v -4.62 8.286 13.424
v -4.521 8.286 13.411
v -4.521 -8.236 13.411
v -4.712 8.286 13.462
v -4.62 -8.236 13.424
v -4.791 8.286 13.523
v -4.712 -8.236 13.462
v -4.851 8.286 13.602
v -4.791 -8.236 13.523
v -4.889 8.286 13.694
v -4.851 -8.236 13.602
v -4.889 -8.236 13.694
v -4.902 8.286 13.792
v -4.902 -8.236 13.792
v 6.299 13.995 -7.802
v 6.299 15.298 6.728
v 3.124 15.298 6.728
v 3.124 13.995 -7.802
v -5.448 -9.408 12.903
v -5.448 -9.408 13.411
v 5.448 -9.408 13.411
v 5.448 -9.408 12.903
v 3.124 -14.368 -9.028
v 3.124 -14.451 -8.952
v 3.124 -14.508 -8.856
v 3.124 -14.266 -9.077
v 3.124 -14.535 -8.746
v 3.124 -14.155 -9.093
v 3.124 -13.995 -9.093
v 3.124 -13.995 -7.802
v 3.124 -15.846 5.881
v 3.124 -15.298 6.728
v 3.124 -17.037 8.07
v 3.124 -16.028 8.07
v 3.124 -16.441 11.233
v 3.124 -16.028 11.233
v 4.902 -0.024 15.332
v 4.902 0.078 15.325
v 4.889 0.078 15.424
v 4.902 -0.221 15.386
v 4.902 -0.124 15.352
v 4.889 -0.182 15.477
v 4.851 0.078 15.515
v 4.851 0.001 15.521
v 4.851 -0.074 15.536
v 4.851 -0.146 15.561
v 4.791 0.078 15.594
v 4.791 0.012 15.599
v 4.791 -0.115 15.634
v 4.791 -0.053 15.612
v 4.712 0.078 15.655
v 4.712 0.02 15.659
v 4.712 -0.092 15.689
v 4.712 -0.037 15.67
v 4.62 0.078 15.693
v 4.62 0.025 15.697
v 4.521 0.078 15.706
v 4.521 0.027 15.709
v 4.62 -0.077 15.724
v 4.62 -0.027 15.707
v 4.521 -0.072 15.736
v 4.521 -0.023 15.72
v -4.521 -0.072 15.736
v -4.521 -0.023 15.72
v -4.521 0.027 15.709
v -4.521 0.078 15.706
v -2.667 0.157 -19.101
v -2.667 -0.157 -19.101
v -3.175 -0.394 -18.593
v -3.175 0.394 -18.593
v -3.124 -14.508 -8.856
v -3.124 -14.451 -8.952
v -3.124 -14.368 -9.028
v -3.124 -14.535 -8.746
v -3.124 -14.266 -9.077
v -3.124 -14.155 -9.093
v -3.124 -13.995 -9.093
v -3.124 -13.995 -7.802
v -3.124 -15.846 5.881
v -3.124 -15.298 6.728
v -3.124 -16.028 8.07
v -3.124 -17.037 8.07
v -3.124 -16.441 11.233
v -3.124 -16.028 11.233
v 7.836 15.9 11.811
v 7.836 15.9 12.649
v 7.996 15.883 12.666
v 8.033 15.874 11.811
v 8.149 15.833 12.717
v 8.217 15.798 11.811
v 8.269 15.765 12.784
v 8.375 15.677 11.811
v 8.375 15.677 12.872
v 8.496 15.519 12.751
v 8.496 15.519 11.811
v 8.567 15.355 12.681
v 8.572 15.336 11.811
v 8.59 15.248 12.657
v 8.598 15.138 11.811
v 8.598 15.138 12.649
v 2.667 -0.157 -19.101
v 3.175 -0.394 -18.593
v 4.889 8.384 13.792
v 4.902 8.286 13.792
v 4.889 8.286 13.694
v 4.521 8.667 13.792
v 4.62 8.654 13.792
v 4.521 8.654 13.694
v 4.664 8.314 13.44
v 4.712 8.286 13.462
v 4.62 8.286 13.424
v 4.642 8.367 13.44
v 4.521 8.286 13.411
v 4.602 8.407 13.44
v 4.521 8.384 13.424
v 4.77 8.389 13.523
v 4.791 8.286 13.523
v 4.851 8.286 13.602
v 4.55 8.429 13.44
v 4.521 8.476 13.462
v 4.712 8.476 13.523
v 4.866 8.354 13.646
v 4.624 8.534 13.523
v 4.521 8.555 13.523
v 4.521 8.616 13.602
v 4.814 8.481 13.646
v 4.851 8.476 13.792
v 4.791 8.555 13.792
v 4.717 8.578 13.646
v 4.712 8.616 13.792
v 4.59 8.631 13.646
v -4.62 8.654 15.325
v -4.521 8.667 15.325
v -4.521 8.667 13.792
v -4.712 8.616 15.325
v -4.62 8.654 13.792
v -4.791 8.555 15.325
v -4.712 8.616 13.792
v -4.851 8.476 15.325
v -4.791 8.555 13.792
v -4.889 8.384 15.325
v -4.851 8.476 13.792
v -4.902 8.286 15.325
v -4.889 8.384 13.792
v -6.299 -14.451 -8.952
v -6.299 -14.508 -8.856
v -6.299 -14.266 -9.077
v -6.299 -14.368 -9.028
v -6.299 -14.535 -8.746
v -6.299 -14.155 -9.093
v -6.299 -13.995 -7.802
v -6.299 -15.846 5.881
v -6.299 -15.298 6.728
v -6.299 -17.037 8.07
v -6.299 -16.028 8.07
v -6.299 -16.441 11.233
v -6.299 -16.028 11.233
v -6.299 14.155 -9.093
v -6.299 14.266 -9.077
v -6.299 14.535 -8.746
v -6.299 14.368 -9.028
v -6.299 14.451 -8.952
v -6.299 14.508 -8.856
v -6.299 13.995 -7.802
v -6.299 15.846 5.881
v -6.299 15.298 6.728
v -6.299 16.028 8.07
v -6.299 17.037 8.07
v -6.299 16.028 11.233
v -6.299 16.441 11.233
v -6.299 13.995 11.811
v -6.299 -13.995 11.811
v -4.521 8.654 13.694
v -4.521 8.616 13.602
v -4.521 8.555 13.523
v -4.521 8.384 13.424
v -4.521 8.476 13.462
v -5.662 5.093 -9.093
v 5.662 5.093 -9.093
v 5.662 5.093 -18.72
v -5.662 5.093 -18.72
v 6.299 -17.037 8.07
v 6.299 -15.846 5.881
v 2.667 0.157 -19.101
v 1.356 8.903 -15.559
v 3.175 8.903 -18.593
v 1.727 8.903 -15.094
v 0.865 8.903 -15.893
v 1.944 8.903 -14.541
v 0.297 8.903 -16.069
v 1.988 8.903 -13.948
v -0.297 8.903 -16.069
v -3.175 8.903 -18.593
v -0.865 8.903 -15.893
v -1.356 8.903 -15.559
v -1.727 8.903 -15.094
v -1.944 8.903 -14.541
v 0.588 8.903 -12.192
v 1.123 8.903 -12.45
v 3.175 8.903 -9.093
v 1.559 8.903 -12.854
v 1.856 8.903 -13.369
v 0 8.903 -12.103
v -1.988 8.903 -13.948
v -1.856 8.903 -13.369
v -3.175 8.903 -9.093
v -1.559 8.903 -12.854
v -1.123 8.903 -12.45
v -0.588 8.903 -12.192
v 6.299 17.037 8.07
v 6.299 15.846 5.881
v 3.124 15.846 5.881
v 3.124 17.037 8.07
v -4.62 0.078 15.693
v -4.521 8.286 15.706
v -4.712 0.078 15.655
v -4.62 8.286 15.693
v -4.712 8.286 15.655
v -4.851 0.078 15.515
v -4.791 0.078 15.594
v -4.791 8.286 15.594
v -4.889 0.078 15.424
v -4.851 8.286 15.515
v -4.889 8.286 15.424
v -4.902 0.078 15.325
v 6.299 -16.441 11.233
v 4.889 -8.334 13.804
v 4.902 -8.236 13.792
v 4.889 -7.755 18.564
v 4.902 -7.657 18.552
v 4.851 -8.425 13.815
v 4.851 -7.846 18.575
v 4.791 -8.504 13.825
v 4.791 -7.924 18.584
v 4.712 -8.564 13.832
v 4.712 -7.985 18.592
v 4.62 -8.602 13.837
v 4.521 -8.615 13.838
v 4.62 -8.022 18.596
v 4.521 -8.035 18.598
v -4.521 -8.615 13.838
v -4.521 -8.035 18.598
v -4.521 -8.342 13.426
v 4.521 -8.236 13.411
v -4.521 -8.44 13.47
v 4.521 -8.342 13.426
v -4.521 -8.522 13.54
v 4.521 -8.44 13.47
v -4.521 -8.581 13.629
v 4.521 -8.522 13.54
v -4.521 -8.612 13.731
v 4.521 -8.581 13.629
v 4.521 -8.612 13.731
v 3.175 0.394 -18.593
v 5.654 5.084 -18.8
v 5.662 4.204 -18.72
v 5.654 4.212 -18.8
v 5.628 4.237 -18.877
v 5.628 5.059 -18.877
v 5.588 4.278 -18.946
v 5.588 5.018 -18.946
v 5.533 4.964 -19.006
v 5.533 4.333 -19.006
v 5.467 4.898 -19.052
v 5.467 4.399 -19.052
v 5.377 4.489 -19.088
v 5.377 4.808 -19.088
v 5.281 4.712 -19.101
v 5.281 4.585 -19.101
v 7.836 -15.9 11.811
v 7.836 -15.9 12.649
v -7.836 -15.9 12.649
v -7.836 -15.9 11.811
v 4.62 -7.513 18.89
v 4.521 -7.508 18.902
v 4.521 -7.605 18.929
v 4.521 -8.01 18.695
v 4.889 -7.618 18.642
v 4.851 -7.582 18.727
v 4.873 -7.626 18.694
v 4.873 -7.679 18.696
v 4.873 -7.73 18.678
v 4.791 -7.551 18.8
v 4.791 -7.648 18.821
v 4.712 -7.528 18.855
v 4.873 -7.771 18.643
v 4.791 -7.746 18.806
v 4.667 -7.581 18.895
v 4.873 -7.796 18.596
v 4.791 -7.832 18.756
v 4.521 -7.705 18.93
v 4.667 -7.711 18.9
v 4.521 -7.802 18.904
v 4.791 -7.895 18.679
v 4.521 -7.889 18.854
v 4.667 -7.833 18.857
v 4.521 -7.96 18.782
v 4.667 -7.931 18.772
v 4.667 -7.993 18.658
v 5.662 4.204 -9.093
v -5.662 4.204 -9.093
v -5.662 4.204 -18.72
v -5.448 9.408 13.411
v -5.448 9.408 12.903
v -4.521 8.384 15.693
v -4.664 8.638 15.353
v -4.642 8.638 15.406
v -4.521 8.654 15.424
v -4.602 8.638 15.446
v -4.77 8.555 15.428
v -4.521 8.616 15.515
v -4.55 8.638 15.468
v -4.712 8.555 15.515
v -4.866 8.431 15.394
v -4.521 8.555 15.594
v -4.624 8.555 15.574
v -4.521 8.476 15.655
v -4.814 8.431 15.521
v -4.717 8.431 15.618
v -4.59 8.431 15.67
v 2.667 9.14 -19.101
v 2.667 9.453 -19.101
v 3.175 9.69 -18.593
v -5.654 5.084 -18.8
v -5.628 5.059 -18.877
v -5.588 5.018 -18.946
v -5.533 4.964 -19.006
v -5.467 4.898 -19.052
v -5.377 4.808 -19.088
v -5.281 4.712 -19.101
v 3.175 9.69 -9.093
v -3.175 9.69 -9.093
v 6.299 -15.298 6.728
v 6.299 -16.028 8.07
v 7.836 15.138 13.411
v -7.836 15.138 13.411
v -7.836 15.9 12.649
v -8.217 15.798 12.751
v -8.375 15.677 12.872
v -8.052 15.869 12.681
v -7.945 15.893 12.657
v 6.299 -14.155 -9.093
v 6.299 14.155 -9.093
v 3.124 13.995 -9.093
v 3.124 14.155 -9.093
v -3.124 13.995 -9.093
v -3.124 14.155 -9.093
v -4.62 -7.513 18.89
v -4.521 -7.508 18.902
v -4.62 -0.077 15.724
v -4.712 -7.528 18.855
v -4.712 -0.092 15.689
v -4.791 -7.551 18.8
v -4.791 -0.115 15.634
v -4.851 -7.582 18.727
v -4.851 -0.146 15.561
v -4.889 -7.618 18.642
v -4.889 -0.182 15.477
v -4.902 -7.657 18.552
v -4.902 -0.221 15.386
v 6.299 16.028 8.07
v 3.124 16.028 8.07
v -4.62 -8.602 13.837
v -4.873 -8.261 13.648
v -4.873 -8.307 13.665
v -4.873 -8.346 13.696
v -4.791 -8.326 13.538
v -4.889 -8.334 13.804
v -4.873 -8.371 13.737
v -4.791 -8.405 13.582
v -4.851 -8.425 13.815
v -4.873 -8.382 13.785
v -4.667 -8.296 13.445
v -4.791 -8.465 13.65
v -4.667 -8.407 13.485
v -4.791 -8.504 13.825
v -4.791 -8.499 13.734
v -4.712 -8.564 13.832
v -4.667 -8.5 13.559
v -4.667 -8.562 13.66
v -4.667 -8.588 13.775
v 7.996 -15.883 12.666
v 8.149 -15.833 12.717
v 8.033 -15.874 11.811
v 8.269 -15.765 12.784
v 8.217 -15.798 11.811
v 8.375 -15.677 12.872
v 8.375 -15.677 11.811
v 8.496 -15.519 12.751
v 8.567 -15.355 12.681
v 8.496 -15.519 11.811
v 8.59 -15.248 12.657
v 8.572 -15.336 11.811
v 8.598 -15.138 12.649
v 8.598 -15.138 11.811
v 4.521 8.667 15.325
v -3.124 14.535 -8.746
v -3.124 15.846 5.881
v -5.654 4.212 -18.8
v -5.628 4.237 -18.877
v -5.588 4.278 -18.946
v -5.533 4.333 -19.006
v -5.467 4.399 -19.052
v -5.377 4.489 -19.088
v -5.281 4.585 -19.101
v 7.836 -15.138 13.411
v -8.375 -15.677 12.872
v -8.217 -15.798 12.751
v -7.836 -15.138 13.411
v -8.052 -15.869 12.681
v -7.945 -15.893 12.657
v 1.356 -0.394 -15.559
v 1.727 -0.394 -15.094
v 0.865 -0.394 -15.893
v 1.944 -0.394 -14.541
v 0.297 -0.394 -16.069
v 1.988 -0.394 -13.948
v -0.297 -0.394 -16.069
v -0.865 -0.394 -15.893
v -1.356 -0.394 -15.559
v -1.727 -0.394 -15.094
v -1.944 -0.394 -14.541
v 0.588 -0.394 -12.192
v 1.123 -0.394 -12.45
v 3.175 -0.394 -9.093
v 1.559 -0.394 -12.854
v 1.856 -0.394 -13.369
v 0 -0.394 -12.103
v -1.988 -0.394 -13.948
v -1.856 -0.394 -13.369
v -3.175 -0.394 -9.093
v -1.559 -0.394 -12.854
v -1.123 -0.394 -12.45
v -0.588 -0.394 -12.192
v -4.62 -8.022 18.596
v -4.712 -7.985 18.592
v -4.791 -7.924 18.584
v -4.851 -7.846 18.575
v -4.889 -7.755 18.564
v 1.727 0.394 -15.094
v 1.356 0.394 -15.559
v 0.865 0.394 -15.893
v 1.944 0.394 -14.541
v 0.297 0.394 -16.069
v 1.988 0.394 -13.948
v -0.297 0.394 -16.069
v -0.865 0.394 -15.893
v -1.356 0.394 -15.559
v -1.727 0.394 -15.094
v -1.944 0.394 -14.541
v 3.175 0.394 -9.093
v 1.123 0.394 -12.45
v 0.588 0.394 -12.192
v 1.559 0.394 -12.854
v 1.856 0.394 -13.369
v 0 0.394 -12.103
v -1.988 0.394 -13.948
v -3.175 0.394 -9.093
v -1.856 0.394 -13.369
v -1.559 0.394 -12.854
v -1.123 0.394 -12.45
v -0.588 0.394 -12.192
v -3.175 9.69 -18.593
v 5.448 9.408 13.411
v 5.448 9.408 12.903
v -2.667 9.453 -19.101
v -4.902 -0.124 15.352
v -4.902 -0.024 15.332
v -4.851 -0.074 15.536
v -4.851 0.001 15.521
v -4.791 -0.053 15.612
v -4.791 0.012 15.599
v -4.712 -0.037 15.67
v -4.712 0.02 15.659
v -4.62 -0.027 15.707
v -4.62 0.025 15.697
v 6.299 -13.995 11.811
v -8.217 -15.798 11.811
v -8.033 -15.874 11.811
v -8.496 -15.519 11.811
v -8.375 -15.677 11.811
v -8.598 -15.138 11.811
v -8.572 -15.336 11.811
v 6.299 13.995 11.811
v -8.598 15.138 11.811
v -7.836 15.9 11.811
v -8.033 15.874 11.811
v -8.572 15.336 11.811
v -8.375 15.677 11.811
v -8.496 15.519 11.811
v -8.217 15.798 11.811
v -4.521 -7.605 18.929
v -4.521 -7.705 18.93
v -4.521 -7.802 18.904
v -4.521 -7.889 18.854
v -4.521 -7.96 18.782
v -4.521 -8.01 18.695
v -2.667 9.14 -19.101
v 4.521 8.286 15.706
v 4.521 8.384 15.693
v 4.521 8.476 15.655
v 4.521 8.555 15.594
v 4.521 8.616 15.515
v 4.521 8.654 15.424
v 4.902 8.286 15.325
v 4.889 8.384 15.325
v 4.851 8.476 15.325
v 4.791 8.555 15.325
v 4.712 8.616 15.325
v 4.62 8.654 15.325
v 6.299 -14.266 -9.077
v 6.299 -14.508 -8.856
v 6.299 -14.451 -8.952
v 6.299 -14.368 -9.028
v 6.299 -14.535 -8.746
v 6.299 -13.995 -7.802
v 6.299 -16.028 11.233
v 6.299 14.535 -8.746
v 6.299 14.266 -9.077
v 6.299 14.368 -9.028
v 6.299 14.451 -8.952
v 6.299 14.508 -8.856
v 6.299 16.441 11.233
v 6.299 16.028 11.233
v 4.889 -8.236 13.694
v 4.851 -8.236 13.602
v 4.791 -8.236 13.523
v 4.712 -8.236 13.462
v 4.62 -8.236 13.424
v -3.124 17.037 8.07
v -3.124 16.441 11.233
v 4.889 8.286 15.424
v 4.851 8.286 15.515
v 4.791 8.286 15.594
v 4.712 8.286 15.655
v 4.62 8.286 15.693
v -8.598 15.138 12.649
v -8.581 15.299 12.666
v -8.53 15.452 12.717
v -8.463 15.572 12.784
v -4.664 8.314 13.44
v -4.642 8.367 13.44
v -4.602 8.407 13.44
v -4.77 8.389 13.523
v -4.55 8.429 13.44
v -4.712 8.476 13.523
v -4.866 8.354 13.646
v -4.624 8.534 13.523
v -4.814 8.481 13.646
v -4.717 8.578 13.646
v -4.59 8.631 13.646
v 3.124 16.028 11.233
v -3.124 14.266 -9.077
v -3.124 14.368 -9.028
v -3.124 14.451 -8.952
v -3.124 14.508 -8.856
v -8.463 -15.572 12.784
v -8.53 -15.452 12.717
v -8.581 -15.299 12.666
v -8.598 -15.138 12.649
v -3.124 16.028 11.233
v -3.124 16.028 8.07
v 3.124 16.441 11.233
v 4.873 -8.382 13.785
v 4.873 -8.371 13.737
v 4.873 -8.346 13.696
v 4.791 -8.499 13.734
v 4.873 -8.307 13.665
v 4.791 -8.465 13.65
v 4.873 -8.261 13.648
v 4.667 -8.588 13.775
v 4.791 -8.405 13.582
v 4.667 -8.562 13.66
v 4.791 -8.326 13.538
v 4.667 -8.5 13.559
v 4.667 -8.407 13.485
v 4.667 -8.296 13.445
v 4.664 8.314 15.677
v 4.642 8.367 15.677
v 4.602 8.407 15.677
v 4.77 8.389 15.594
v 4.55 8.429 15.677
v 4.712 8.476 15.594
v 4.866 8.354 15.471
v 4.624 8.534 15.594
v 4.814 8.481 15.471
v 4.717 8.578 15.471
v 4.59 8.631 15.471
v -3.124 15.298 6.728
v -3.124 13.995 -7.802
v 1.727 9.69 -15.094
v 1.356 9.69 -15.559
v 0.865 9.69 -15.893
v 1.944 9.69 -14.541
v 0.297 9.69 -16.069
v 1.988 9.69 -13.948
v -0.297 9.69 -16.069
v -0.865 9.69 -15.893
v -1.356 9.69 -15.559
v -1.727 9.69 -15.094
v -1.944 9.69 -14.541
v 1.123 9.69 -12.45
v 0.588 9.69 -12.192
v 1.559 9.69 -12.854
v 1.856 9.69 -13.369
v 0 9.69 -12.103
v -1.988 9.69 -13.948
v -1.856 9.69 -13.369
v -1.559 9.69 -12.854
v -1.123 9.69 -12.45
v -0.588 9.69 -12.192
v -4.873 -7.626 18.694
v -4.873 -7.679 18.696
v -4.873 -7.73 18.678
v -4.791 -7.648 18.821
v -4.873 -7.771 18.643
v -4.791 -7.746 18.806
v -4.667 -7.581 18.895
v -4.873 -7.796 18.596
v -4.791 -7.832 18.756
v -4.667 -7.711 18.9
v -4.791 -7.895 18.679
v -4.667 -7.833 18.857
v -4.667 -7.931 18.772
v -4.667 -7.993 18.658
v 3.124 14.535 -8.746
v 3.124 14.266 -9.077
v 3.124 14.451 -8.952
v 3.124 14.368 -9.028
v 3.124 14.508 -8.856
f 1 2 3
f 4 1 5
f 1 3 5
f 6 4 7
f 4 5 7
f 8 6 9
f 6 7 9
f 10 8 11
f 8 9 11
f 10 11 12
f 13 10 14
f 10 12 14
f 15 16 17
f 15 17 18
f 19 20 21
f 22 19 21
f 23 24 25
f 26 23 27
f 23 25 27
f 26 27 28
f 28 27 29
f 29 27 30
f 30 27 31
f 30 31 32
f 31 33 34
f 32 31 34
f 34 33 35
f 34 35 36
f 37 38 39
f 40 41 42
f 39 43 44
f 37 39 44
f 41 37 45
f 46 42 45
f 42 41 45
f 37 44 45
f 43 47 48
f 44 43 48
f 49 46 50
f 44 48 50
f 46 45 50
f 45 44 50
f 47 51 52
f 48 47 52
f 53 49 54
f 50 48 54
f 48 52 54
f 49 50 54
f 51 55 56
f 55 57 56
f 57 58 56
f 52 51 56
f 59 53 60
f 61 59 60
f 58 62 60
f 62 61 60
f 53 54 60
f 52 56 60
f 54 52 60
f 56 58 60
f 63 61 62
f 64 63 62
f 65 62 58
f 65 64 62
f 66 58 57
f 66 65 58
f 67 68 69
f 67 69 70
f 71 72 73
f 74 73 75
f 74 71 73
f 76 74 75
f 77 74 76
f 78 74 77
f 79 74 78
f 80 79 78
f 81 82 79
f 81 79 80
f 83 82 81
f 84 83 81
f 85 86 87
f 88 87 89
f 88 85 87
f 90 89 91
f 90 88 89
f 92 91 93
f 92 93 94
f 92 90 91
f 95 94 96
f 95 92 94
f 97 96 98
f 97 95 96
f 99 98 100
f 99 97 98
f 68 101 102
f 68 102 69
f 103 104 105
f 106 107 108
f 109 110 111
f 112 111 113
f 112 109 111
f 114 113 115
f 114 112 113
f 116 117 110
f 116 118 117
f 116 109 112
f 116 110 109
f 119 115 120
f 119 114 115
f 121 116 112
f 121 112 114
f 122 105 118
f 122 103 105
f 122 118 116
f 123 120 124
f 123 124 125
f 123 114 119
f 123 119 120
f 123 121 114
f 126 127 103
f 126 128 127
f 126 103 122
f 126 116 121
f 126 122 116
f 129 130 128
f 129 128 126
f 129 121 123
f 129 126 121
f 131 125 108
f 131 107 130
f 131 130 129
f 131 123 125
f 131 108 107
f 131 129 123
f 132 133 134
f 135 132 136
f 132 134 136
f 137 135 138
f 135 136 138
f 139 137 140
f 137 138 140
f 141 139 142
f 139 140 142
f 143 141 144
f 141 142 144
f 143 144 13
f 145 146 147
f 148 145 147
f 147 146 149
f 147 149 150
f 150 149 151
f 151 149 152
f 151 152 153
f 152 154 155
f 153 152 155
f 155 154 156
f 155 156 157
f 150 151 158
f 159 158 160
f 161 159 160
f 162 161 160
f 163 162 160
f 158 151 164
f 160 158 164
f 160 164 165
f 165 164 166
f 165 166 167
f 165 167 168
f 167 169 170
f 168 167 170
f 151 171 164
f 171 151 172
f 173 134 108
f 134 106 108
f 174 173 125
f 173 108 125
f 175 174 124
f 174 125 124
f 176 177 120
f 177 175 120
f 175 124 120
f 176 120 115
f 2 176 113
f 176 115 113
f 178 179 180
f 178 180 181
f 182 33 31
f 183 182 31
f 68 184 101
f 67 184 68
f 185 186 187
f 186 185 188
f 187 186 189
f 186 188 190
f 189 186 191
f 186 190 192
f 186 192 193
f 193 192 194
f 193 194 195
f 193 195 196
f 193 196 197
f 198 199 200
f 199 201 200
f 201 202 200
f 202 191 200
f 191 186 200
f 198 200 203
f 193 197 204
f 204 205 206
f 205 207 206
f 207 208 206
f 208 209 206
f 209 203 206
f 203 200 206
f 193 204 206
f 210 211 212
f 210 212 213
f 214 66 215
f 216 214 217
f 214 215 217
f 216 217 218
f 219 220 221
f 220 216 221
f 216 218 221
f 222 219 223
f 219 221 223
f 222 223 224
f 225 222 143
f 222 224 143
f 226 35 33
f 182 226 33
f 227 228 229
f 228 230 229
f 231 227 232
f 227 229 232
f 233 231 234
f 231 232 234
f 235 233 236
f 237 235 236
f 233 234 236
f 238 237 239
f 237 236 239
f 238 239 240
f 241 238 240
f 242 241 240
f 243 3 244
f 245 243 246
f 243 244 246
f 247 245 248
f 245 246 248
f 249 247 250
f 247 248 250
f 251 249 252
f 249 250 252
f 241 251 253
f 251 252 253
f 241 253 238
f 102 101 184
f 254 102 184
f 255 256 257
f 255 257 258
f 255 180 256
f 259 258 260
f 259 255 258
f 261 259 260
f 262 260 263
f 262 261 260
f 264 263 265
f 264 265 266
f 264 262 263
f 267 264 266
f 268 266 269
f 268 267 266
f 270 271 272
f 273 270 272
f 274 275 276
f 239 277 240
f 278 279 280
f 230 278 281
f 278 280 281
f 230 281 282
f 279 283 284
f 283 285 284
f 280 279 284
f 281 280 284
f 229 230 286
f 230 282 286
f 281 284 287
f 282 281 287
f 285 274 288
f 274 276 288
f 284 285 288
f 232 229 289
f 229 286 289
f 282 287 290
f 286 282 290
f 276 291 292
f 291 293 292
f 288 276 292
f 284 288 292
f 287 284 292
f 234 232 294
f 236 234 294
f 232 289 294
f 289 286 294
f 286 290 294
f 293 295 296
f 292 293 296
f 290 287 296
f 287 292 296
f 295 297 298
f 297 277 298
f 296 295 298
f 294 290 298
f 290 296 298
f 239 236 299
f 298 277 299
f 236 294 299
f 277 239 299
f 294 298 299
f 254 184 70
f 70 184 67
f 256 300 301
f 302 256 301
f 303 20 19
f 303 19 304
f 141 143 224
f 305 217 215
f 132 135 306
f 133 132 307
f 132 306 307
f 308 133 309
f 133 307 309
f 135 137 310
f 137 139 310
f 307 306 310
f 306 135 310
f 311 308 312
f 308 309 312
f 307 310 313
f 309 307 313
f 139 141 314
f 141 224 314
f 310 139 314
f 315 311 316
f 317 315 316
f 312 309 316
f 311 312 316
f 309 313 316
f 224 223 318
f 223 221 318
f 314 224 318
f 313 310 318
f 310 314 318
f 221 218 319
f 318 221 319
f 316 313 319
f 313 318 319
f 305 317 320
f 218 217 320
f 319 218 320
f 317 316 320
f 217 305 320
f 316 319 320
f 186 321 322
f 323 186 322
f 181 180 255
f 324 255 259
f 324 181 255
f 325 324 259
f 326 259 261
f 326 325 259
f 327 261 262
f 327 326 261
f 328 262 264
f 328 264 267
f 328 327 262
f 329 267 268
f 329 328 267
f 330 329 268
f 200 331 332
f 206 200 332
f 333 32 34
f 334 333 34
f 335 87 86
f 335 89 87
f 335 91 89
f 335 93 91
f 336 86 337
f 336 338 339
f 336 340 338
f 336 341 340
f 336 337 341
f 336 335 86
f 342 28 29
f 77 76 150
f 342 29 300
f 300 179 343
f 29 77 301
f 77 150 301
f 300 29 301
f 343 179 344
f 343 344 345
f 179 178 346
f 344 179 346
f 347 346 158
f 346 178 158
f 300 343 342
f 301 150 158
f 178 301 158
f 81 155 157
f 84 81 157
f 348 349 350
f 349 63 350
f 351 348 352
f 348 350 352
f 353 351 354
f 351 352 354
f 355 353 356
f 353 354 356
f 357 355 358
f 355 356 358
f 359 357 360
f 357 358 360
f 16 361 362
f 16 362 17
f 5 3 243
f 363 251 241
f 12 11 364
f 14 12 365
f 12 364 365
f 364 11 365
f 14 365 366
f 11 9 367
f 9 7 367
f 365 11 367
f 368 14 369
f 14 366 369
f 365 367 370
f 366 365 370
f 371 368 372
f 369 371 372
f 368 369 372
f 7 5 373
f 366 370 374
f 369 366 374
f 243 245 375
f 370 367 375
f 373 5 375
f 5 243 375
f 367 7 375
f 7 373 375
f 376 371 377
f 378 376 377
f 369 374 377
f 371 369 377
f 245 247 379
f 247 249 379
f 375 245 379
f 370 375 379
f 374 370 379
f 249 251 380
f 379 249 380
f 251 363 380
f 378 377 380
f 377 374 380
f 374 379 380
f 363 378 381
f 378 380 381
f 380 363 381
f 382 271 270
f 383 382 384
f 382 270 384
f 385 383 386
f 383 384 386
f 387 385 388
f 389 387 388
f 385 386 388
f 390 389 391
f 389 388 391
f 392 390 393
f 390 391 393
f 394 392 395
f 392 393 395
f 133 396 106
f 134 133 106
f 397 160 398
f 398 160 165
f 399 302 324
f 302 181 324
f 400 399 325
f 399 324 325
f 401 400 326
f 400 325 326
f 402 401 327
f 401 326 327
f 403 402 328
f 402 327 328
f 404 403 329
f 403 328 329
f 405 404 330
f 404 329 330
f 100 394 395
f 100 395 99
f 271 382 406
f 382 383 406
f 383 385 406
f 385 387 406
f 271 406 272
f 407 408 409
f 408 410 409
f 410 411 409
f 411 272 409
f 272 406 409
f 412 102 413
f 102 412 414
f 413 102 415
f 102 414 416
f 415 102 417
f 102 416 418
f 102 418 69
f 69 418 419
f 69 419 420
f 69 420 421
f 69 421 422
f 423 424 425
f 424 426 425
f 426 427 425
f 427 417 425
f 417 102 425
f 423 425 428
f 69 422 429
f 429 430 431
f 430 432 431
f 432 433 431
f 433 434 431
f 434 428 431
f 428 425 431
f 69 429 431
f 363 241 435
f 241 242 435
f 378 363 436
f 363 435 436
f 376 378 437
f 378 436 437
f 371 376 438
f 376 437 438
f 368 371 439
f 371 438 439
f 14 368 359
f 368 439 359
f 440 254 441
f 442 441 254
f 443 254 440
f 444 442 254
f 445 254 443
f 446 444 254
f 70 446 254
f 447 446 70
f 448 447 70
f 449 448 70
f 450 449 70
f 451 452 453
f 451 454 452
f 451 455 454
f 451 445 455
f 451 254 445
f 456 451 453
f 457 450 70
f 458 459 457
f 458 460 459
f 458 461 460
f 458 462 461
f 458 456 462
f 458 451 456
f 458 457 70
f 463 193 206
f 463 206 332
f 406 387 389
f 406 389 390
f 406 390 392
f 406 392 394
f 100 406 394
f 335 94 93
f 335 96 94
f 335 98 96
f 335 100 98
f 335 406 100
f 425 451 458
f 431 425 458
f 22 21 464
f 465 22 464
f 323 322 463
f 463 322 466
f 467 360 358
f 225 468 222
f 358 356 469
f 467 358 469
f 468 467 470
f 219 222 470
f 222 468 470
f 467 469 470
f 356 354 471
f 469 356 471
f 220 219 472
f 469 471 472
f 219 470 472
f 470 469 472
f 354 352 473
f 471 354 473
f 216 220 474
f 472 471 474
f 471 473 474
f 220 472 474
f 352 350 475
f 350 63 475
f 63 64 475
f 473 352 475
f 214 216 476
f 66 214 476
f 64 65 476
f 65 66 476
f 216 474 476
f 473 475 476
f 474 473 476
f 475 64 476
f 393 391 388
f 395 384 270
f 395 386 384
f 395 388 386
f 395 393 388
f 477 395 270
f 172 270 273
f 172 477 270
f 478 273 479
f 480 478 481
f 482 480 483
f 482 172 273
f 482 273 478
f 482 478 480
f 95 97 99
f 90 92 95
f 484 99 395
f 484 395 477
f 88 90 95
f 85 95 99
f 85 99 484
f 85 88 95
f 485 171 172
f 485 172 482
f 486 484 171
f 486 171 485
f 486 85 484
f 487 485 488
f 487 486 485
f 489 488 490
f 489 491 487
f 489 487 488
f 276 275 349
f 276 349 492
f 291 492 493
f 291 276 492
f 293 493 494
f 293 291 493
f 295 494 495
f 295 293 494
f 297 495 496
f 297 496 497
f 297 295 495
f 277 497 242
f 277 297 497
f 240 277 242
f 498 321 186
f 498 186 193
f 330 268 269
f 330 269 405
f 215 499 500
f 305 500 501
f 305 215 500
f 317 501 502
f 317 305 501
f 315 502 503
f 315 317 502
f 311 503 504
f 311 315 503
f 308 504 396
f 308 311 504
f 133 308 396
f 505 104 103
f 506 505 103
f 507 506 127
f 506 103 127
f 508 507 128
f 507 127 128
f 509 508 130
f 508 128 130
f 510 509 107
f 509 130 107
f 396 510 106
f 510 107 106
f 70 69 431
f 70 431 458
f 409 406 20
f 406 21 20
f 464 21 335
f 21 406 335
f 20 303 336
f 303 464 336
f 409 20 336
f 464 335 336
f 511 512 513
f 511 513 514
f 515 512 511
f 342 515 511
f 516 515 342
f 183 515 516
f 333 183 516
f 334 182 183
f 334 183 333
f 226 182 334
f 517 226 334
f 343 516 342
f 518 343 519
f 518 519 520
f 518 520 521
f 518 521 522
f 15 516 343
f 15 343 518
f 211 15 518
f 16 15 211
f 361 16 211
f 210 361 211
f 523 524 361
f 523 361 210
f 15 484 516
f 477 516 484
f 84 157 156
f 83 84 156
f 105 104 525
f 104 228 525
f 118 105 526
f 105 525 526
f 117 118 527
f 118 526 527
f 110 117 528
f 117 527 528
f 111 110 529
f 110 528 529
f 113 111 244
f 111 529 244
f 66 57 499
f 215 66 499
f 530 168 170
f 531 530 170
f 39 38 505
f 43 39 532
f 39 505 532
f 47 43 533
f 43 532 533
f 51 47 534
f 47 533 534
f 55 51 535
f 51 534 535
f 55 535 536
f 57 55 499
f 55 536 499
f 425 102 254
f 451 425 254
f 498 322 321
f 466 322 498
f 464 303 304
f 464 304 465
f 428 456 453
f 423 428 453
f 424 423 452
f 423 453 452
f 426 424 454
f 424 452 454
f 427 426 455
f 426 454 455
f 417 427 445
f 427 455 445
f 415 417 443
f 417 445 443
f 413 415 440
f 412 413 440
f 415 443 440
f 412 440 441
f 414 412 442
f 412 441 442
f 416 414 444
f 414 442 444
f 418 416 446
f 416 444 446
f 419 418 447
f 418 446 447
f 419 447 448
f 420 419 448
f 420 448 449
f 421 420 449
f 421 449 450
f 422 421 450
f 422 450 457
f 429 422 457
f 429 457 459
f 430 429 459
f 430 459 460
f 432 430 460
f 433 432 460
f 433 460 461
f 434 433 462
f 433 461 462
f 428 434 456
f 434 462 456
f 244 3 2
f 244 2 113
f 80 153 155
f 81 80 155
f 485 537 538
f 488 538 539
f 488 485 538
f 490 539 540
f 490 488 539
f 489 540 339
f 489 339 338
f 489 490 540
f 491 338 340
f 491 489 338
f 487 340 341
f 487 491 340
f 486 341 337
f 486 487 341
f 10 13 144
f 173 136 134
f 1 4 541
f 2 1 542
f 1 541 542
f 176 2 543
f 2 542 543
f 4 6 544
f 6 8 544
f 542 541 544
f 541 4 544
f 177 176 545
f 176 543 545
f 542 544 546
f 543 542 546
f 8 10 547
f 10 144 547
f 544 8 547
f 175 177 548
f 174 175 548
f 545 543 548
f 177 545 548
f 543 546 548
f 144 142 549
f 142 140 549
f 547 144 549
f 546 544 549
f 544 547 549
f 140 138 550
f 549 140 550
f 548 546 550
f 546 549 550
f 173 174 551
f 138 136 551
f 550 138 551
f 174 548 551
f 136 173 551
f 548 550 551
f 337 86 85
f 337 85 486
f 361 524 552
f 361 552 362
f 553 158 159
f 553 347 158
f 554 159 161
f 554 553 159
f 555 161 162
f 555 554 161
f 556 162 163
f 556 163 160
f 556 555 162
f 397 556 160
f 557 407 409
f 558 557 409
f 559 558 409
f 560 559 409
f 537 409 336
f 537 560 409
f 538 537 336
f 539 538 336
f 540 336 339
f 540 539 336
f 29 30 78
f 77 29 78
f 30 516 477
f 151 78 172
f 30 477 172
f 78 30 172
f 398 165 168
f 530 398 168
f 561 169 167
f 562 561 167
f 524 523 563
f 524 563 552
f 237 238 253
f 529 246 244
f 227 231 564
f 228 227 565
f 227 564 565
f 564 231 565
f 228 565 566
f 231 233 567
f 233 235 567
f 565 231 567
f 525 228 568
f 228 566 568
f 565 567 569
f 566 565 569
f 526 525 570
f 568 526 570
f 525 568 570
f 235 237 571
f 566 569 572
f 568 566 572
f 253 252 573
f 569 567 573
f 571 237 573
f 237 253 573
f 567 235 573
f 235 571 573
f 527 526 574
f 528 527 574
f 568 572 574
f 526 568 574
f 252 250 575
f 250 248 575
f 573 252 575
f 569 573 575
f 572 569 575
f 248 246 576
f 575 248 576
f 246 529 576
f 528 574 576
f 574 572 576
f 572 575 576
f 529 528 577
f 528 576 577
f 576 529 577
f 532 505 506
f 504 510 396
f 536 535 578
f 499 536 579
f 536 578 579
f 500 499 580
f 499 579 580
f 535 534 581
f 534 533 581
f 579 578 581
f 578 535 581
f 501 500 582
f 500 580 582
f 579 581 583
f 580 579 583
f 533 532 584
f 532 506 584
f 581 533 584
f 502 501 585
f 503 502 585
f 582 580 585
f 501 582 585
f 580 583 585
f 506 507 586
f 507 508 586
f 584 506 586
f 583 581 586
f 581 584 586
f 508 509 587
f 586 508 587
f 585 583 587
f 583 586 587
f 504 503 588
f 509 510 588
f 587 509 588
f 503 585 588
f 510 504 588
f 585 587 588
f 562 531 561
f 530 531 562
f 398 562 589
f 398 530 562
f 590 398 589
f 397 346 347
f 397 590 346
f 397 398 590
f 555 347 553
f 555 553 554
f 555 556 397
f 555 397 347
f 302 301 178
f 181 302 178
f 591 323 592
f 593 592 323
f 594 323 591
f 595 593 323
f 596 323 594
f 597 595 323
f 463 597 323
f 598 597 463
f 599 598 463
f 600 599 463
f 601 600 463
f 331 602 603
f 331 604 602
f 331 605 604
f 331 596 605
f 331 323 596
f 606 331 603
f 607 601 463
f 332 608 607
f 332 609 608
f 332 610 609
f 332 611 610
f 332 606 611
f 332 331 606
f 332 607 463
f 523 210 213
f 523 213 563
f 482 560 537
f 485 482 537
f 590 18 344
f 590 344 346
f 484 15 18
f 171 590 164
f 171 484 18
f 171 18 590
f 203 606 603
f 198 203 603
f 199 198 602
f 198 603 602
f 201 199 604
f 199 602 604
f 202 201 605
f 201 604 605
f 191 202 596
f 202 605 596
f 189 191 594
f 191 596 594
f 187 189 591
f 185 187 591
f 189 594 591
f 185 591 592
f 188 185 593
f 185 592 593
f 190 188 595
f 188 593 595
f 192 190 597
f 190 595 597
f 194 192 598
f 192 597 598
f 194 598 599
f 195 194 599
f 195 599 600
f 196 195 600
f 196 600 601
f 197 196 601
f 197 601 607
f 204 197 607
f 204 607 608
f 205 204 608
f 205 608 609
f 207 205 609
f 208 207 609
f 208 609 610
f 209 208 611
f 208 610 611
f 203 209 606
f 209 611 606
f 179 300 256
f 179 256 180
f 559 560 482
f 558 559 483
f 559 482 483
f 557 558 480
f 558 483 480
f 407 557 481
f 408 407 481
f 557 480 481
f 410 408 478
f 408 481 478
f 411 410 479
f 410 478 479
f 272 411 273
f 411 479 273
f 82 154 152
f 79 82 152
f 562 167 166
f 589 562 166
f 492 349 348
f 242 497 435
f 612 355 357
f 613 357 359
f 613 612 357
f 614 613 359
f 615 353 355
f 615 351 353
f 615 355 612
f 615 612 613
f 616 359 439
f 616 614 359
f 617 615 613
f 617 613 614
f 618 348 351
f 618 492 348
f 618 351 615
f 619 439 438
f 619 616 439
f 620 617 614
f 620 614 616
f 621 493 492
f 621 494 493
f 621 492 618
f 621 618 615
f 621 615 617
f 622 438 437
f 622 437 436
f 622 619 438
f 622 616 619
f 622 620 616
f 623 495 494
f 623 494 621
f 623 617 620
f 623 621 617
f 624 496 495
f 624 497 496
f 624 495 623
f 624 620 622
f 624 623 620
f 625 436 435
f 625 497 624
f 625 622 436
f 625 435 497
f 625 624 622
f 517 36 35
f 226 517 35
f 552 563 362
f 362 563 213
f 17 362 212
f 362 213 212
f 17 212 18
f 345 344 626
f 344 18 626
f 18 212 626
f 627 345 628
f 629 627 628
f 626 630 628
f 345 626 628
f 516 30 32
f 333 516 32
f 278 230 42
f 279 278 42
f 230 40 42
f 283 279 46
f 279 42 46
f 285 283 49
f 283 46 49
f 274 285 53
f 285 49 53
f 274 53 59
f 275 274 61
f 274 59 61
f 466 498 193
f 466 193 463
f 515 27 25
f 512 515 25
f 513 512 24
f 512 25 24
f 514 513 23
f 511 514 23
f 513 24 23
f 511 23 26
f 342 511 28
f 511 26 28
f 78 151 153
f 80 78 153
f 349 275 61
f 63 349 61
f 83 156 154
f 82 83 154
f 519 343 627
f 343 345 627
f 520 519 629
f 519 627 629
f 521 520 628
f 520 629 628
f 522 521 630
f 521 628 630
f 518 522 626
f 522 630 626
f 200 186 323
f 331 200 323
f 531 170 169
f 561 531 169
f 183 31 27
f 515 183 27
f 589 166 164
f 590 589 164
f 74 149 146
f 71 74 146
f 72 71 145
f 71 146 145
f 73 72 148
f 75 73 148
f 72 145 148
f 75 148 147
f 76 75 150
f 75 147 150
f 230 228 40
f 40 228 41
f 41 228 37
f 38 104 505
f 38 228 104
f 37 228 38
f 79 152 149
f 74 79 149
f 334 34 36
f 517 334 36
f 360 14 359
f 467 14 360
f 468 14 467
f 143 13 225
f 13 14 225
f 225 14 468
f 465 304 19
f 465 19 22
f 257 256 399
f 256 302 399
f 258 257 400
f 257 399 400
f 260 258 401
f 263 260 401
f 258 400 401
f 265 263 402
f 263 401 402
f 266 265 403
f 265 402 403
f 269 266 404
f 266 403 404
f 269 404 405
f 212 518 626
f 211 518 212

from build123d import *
from OCP.BRepFilletAPI import BRepFilletAPI_MakeChamfer

# Parameters (mm, degrees)
BOSS_EXTRUDE1_DEPTH  = 4.9022
SKETCH3_W            = 17.1958
SKETCH3_H            = 31.8008
BOSS_EXTRUDE2_DEPTH  = 1.6002
CHAMFER1_SIZE        = 0.762
SKETCH4_W            = 10.896044092
SKETCH4_H            = 18.816032884
CUT_EXTRUDE2_DEPTH   = 0.508
SKETCH5_W            = 12.5984
SKETCH5_H            = 27.9908
BOSS_EXTRUDE3_DEPTH  = 20.9042
SKETCH6_W            = 6.35
SKETCH6_H            = 0.7874
BOSS_EXTRUDE4_DEPTH  = 10.0076
CHAMFER2_SIZE        = 0.508
CHAMFER3_SIZE        = 0.508
CHAMFER3_SIZE2       = 0.23688429
SKETCH7_R            = 1.9939
CUT_EXTRUDE3_DEPTH   = 0.7874
LPATTERN1_COUNT      = 2
LPATTERN1_PITCH      = 9.2964
SKETCH9_W            = 11.324393704
SKETCH9_H            = 0.889
BOSS_EXTRUDE5_DEPTH  = 10.0076
FILLET1_R            = 0.381
BOSS_EXTRUDE6_DEPTH  = 3.175
FILLET2_R            = 0.381
FILLET2_OF_MIRROR3_R = 0.381
MIRROR4_START        = -6.2992
MIRROR4_DEPTH        = 3.175
MIRROR4_START_2      = 3.1242
MIRROR4_2_DEPTH      = 3.175
FILLET3_R            = 0.381
FILLET4_R            = 0.762


# Read off the part's stored shape, not the designer's step: Mirror4
with BuildPart() as part:
    # Sketch2 → Boss-Extrude1 (new, symmetric)
    with BuildSketch(Plane(origin=(0, 0, 0), x_dir=(0, 0, -1), z_dir=(1, 0, 0))):
        Polygon((-19.1008, -7.973972857), (-15.705952073, 0), (-15.705952073, 8.666558462), (-13.4112, 8.666558462), (-13.4112, -8.666558462), align=None)
    extrude(amount=BOSS_EXTRUDE1_DEPTH, both=True)

    # Sketch3 → Boss-Extrude2 (add)
    with BuildSketch(Plane(origin=(0, 0, 13.4112), x_dir=(-1, 0, 0), z_dir=(0, 0, -1))):
        Rectangle(SKETCH3_W, SKETCH3_H)
    extrude(amount=BOSS_EXTRUDE2_DEPTH)

    # Chamfer1
    chamfer1_edges = [part.edges().sort_by_distance(p)[0] for p in [
        (-8.5979, 0, 13.4112),
        (0, 15.9004, 13.4112),
        (8.5979, 0, 13.4112),
        (0, -15.9004, 13.4112),
    ]]
    chamfer(chamfer1_edges, length=CHAMFER1_SIZE)

    # Sketch4 → Cut-Extrude2 (cut)
    with BuildSketch(Plane.XY.offset(13.4112)):
        Rectangle(SKETCH4_W, SKETCH4_H)
    extrude(amount=-CUT_EXTRUDE2_DEPTH, mode=Mode.SUBTRACT)


with BuildPart() as cut_extrude2_piece_1:
    # of the separate pieces the step leaves, piece 1, a body of its own (cut_extrude2_pieces)
    add(part.part.solids().sort_by_distance((8.5979, 15.9004, 12.6492))[0])

    # Sketch5 → Boss-Extrude3 (add)
    with BuildSketch(Plane(origin=(0, 0, 11.811), x_dir=(-1, 0, 0), z_dir=(0, 0, -1))):
        Rectangle(SKETCH5_W, SKETCH5_H)
    extrude(amount=BOSS_EXTRUDE3_DEPTH)

    # Sketch9 → Boss-Extrude5 (add)
    with BuildSketch(Plane(origin=(0, 0, -9.0932), x_dir=(-1, 0, 0), z_dir=(0, 0, -1))):
        with Locations((0, 4.6482)):
            Rectangle(SKETCH9_W, SKETCH9_H)
    extrude(amount=BOSS_EXTRUDE5_DEPTH)

    # Fillet1
    fillet1_edges = [cut_extrude2_piece_1.edges().sort_by_distance(p)[0] for p in [
        (-5.662196852, 4.6482, -19.1008),
        (0, 5.0927, -19.1008),
        (5.662196852, 4.6482, -19.1008),
        (0, 4.2037, -19.1008),
    ]]
    fillet(fillet1_edges, radius=FILLET1_R)

    # Sketch11 → Boss-Extrude6 (add)
    with BuildSketch(Plane(origin=(6.2992, 0, 0), x_dir=(0, 0, -1), z_dir=(1, 0, 0))):
        Polygon((9.0932, 13.9954), (9.0932, 14.5034), (-5.880915867, 15.845854324), (-8.069641774, 17.036875135), (-11.233356301, 16.44136473), (-11.233356301, 16.028204475), (-8.069641774, 16.028204475), (-6.727879648, 15.298068915), (7.80245849, 13.9954), align=None)
    boss_extrude6 = extrude(amount=-BOSS_EXTRUDE6_DEPTH)

    # Fillet2
    fillet2_edges = [cut_extrude2_piece_1.edges().sort_by_distance(p)[0] for p in [
        (4.7117, 14.5034, -9.0932),
    ]]
    fillet(fillet2_edges, radius=FILLET2_R)

    # Mirror3: Boss-Extrude6 across plane
    add(boss_extrude6.mirror(Plane(origin=(0, 0, 0), x_dir=(0, 0, 1), z_dir=(1, 0, 0))))

    # Fillet2 of Mirror3
    fillet2_of_mirror3_edges = [cut_extrude2_piece_1.edges().sort_by_distance(p)[0] for p in [
        (-4.7117, 14.5034, -9.0932),
    ]]
    fillet(fillet2_of_mirror3_edges, radius=FILLET2_OF_MIRROR3_R)

    # Mirror4 outline → Mirror4 (add)
    with BuildSketch(Plane.YZ.offset(MIRROR4_START)):
        with BuildLine():
            Line((-16.028204475, 8.069641774), (-16.028204475, 11.233356301))
            Line((-16.028204475, 11.233356301), (-16.44136473, 11.233356301))
            Line((-16.44136473, 11.233356301), (-17.036875135, 8.069641774))
            Line((-17.036875135, 8.069641774), (-15.845854324, 5.880915867))
            Line((-15.845854324, 5.880915867), (-14.534507258, -8.746220836))
            ThreePointArc((-14.534507258, -8.746220836), (-14.412127508, -8.993378714), (-14.155029218, -9.0932))
            Line((-14.155029218, -9.0932), (-13.9954, -9.0932))
            Line((-13.9954, -9.0932), (-13.9954, -7.80245849))
            Line((-13.9954, -7.80245849), (-15.298068915, 6.727879648))
            Line((-15.298068915, 6.727879648), (-16.028204475, 8.069641774))
        make_face()
    extrude(amount=MIRROR4_DEPTH)

    # Mirror4 2 outline → Mirror4 2 (add)
    with BuildSketch(Plane.YZ.offset(MIRROR4_START_2)):
        with BuildLine():
            Line((-16.028204475, 8.069641774), (-16.028204475, 11.233356301))
            Line((-16.028204475, 11.233356301), (-16.44136473, 11.233356301))
            Line((-16.44136473, 11.233356301), (-17.036875135, 8.069641774))
            Line((-17.036875135, 8.069641774), (-15.845854324, 5.880915867))
            Line((-15.845854324, 5.880915867), (-14.534507258, -8.746220836))
            ThreePointArc((-14.534507258, -8.746220836), (-14.412127508, -8.993378714), (-14.155029218, -9.0932))
            Line((-14.155029218, -9.0932), (-13.9954, -9.0932))
            Line((-13.9954, -9.0932), (-13.9954, -7.80245849))
            Line((-13.9954, -7.80245849), (-15.298068915, 6.727879648))
            Line((-15.298068915, 6.727879648), (-16.028204475, 8.069641774))
        make_face()
    extrude(amount=MIRROR4_2_DEPTH)

    # Fillet4
    fillet4_edges = [cut_extrude2_piece_1.edges().sort_by_distance(p)[0] for p in [
        (-8.5979, -15.9004, 12.2301),
        (-8.5979, 15.9004, 12.2301),
        (8.5979, 15.9004, 12.2301),
        (8.5979, -15.9004, 12.2301),
    ]]
    fillet(fillet4_edges, radius=FILLET4_R)


with BuildPart() as cut_extrude2_piece_2:
    # of the separate pieces the step leaves, piece 2, a body of its own (cut_extrude2_pieces)
    add(part.part.solids().sort_by_distance((-4.9022, 8.666558462, 15.705952073))[0])

    # Fillet3
    fillet3_edges = [cut_extrude2_piece_2.edges().sort_by_distance(p)[0] for p in [
        (4.9022, 8.666558462, 14.558576037),
        (4.9022, 4.333279231, 15.705952073),
        (4.9022, -3.986986428, 17.403376037),
        (4.9022, -8.320265659, 16.256),
        (-4.9022, -3.986986428, 17.403376037),
        (-4.9022, 4.333279231, 15.705952073),
        (-4.9022, 8.666558462, 14.558576037),
        (-4.9022, 0, 13.4112),
        (-4.9022, -8.320265659, 16.256),
        (4.9022, 0, 13.4112),
        (0, -7.973972857, 19.1008),
        (0, 0, 15.705952073),
        (0, 8.666558462, 15.705952073),
        (0, 8.666558462, 13.4112),
        (0, -8.666558462, 13.4112),
    ]]
    fillet(fillet3_edges, radius=FILLET3_R)


with BuildPart() as body_3:
    # Sketch6 → Boss-Extrude4 (new body)
    with BuildSketch(Plane(origin=(0, 0, -9.0932), x_dir=(-1, 0, 0), z_dir=(0, 0, -1))):
        with Locations((0, 9.2964)):
            Rectangle(SKETCH6_W, SKETCH6_H)
    extrude(amount=BOSS_EXTRUDE4_DEPTH)

    # Chamfer2
    chamfer2_edges = [body_3.edges().sort_by_distance(p)[0] for p in [
        (3.175, 9.2964, -19.1008),
        (-3.175, 9.2964, -19.1008),
    ]]
    chamfer(chamfer2_edges, length=CHAMFER2_SIZE)

    # Chamfer3: one chamfer whose edges measure the first distance from different faces: ONE call of the kernel's chamfer builder (chamfer() names one face for all edges)
    chamfer3_edges_1 = [body_3.edges().sort_by_distance(p)[0] for p in [
        (0, 8.9027, -19.1008),
    ]]
    chamfer3_side_1 = [body_3.faces().sort_by_distance(p)[0] for p in [
        (0, 8.9027, -14.077287598),
    ]]
    chamfer3_edges_2 = [body_3.edges().sort_by_distance(p)[0] for p in [
        (0, 9.6901, -19.1008),
    ]]
    chamfer3_side_2 = [body_3.faces().sort_by_distance(p)[0] for p in [
        (0, 9.6901, -14.077287598),
    ]]
    chamfer3 = BRepFilletAPI_MakeChamfer(body_3.part.solid().wrapped)
    for e in chamfer3_edges_1:
        chamfer3.Add(CHAMFER3_SIZE, CHAMFER3_SIZE2, e.wrapped, chamfer3_side_1[0].wrapped)  # the first distance lies on this face
    for e in chamfer3_edges_2:
        chamfer3.Add(CHAMFER3_SIZE, CHAMFER3_SIZE2, e.wrapped, chamfer3_side_2[0].wrapped)  # the first distance lies on this face
    add(Compound.cast(chamfer3.Shape()), mode=Mode.REPLACE)

    # Sketch7 → Cut-Extrude3 (cut)
    with BuildSketch(Plane(origin=(0, 9.6901, 0), x_dir=(1, 0, 0), z_dir=(0, 1, 0))):
        with Locations(Location((0, 14.097, 0), (0, 0, 270))):
            Circle(SKETCH7_R)
    extrude(amount=-CUT_EXTRUDE3_DEPTH, mode=Mode.SUBTRACT)


with BuildPart() as lpattern1_1:
    # LPattern1: pattern copy
    add(body_3.part.moved(Location(Vector(0, -1, 0) * (1 * LPATTERN1_PITCH))))


solid = Compound([cut_extrude2_piece_1.part, cut_extrude2_piece_2.part, body_3.part, lpattern1_1.part])
